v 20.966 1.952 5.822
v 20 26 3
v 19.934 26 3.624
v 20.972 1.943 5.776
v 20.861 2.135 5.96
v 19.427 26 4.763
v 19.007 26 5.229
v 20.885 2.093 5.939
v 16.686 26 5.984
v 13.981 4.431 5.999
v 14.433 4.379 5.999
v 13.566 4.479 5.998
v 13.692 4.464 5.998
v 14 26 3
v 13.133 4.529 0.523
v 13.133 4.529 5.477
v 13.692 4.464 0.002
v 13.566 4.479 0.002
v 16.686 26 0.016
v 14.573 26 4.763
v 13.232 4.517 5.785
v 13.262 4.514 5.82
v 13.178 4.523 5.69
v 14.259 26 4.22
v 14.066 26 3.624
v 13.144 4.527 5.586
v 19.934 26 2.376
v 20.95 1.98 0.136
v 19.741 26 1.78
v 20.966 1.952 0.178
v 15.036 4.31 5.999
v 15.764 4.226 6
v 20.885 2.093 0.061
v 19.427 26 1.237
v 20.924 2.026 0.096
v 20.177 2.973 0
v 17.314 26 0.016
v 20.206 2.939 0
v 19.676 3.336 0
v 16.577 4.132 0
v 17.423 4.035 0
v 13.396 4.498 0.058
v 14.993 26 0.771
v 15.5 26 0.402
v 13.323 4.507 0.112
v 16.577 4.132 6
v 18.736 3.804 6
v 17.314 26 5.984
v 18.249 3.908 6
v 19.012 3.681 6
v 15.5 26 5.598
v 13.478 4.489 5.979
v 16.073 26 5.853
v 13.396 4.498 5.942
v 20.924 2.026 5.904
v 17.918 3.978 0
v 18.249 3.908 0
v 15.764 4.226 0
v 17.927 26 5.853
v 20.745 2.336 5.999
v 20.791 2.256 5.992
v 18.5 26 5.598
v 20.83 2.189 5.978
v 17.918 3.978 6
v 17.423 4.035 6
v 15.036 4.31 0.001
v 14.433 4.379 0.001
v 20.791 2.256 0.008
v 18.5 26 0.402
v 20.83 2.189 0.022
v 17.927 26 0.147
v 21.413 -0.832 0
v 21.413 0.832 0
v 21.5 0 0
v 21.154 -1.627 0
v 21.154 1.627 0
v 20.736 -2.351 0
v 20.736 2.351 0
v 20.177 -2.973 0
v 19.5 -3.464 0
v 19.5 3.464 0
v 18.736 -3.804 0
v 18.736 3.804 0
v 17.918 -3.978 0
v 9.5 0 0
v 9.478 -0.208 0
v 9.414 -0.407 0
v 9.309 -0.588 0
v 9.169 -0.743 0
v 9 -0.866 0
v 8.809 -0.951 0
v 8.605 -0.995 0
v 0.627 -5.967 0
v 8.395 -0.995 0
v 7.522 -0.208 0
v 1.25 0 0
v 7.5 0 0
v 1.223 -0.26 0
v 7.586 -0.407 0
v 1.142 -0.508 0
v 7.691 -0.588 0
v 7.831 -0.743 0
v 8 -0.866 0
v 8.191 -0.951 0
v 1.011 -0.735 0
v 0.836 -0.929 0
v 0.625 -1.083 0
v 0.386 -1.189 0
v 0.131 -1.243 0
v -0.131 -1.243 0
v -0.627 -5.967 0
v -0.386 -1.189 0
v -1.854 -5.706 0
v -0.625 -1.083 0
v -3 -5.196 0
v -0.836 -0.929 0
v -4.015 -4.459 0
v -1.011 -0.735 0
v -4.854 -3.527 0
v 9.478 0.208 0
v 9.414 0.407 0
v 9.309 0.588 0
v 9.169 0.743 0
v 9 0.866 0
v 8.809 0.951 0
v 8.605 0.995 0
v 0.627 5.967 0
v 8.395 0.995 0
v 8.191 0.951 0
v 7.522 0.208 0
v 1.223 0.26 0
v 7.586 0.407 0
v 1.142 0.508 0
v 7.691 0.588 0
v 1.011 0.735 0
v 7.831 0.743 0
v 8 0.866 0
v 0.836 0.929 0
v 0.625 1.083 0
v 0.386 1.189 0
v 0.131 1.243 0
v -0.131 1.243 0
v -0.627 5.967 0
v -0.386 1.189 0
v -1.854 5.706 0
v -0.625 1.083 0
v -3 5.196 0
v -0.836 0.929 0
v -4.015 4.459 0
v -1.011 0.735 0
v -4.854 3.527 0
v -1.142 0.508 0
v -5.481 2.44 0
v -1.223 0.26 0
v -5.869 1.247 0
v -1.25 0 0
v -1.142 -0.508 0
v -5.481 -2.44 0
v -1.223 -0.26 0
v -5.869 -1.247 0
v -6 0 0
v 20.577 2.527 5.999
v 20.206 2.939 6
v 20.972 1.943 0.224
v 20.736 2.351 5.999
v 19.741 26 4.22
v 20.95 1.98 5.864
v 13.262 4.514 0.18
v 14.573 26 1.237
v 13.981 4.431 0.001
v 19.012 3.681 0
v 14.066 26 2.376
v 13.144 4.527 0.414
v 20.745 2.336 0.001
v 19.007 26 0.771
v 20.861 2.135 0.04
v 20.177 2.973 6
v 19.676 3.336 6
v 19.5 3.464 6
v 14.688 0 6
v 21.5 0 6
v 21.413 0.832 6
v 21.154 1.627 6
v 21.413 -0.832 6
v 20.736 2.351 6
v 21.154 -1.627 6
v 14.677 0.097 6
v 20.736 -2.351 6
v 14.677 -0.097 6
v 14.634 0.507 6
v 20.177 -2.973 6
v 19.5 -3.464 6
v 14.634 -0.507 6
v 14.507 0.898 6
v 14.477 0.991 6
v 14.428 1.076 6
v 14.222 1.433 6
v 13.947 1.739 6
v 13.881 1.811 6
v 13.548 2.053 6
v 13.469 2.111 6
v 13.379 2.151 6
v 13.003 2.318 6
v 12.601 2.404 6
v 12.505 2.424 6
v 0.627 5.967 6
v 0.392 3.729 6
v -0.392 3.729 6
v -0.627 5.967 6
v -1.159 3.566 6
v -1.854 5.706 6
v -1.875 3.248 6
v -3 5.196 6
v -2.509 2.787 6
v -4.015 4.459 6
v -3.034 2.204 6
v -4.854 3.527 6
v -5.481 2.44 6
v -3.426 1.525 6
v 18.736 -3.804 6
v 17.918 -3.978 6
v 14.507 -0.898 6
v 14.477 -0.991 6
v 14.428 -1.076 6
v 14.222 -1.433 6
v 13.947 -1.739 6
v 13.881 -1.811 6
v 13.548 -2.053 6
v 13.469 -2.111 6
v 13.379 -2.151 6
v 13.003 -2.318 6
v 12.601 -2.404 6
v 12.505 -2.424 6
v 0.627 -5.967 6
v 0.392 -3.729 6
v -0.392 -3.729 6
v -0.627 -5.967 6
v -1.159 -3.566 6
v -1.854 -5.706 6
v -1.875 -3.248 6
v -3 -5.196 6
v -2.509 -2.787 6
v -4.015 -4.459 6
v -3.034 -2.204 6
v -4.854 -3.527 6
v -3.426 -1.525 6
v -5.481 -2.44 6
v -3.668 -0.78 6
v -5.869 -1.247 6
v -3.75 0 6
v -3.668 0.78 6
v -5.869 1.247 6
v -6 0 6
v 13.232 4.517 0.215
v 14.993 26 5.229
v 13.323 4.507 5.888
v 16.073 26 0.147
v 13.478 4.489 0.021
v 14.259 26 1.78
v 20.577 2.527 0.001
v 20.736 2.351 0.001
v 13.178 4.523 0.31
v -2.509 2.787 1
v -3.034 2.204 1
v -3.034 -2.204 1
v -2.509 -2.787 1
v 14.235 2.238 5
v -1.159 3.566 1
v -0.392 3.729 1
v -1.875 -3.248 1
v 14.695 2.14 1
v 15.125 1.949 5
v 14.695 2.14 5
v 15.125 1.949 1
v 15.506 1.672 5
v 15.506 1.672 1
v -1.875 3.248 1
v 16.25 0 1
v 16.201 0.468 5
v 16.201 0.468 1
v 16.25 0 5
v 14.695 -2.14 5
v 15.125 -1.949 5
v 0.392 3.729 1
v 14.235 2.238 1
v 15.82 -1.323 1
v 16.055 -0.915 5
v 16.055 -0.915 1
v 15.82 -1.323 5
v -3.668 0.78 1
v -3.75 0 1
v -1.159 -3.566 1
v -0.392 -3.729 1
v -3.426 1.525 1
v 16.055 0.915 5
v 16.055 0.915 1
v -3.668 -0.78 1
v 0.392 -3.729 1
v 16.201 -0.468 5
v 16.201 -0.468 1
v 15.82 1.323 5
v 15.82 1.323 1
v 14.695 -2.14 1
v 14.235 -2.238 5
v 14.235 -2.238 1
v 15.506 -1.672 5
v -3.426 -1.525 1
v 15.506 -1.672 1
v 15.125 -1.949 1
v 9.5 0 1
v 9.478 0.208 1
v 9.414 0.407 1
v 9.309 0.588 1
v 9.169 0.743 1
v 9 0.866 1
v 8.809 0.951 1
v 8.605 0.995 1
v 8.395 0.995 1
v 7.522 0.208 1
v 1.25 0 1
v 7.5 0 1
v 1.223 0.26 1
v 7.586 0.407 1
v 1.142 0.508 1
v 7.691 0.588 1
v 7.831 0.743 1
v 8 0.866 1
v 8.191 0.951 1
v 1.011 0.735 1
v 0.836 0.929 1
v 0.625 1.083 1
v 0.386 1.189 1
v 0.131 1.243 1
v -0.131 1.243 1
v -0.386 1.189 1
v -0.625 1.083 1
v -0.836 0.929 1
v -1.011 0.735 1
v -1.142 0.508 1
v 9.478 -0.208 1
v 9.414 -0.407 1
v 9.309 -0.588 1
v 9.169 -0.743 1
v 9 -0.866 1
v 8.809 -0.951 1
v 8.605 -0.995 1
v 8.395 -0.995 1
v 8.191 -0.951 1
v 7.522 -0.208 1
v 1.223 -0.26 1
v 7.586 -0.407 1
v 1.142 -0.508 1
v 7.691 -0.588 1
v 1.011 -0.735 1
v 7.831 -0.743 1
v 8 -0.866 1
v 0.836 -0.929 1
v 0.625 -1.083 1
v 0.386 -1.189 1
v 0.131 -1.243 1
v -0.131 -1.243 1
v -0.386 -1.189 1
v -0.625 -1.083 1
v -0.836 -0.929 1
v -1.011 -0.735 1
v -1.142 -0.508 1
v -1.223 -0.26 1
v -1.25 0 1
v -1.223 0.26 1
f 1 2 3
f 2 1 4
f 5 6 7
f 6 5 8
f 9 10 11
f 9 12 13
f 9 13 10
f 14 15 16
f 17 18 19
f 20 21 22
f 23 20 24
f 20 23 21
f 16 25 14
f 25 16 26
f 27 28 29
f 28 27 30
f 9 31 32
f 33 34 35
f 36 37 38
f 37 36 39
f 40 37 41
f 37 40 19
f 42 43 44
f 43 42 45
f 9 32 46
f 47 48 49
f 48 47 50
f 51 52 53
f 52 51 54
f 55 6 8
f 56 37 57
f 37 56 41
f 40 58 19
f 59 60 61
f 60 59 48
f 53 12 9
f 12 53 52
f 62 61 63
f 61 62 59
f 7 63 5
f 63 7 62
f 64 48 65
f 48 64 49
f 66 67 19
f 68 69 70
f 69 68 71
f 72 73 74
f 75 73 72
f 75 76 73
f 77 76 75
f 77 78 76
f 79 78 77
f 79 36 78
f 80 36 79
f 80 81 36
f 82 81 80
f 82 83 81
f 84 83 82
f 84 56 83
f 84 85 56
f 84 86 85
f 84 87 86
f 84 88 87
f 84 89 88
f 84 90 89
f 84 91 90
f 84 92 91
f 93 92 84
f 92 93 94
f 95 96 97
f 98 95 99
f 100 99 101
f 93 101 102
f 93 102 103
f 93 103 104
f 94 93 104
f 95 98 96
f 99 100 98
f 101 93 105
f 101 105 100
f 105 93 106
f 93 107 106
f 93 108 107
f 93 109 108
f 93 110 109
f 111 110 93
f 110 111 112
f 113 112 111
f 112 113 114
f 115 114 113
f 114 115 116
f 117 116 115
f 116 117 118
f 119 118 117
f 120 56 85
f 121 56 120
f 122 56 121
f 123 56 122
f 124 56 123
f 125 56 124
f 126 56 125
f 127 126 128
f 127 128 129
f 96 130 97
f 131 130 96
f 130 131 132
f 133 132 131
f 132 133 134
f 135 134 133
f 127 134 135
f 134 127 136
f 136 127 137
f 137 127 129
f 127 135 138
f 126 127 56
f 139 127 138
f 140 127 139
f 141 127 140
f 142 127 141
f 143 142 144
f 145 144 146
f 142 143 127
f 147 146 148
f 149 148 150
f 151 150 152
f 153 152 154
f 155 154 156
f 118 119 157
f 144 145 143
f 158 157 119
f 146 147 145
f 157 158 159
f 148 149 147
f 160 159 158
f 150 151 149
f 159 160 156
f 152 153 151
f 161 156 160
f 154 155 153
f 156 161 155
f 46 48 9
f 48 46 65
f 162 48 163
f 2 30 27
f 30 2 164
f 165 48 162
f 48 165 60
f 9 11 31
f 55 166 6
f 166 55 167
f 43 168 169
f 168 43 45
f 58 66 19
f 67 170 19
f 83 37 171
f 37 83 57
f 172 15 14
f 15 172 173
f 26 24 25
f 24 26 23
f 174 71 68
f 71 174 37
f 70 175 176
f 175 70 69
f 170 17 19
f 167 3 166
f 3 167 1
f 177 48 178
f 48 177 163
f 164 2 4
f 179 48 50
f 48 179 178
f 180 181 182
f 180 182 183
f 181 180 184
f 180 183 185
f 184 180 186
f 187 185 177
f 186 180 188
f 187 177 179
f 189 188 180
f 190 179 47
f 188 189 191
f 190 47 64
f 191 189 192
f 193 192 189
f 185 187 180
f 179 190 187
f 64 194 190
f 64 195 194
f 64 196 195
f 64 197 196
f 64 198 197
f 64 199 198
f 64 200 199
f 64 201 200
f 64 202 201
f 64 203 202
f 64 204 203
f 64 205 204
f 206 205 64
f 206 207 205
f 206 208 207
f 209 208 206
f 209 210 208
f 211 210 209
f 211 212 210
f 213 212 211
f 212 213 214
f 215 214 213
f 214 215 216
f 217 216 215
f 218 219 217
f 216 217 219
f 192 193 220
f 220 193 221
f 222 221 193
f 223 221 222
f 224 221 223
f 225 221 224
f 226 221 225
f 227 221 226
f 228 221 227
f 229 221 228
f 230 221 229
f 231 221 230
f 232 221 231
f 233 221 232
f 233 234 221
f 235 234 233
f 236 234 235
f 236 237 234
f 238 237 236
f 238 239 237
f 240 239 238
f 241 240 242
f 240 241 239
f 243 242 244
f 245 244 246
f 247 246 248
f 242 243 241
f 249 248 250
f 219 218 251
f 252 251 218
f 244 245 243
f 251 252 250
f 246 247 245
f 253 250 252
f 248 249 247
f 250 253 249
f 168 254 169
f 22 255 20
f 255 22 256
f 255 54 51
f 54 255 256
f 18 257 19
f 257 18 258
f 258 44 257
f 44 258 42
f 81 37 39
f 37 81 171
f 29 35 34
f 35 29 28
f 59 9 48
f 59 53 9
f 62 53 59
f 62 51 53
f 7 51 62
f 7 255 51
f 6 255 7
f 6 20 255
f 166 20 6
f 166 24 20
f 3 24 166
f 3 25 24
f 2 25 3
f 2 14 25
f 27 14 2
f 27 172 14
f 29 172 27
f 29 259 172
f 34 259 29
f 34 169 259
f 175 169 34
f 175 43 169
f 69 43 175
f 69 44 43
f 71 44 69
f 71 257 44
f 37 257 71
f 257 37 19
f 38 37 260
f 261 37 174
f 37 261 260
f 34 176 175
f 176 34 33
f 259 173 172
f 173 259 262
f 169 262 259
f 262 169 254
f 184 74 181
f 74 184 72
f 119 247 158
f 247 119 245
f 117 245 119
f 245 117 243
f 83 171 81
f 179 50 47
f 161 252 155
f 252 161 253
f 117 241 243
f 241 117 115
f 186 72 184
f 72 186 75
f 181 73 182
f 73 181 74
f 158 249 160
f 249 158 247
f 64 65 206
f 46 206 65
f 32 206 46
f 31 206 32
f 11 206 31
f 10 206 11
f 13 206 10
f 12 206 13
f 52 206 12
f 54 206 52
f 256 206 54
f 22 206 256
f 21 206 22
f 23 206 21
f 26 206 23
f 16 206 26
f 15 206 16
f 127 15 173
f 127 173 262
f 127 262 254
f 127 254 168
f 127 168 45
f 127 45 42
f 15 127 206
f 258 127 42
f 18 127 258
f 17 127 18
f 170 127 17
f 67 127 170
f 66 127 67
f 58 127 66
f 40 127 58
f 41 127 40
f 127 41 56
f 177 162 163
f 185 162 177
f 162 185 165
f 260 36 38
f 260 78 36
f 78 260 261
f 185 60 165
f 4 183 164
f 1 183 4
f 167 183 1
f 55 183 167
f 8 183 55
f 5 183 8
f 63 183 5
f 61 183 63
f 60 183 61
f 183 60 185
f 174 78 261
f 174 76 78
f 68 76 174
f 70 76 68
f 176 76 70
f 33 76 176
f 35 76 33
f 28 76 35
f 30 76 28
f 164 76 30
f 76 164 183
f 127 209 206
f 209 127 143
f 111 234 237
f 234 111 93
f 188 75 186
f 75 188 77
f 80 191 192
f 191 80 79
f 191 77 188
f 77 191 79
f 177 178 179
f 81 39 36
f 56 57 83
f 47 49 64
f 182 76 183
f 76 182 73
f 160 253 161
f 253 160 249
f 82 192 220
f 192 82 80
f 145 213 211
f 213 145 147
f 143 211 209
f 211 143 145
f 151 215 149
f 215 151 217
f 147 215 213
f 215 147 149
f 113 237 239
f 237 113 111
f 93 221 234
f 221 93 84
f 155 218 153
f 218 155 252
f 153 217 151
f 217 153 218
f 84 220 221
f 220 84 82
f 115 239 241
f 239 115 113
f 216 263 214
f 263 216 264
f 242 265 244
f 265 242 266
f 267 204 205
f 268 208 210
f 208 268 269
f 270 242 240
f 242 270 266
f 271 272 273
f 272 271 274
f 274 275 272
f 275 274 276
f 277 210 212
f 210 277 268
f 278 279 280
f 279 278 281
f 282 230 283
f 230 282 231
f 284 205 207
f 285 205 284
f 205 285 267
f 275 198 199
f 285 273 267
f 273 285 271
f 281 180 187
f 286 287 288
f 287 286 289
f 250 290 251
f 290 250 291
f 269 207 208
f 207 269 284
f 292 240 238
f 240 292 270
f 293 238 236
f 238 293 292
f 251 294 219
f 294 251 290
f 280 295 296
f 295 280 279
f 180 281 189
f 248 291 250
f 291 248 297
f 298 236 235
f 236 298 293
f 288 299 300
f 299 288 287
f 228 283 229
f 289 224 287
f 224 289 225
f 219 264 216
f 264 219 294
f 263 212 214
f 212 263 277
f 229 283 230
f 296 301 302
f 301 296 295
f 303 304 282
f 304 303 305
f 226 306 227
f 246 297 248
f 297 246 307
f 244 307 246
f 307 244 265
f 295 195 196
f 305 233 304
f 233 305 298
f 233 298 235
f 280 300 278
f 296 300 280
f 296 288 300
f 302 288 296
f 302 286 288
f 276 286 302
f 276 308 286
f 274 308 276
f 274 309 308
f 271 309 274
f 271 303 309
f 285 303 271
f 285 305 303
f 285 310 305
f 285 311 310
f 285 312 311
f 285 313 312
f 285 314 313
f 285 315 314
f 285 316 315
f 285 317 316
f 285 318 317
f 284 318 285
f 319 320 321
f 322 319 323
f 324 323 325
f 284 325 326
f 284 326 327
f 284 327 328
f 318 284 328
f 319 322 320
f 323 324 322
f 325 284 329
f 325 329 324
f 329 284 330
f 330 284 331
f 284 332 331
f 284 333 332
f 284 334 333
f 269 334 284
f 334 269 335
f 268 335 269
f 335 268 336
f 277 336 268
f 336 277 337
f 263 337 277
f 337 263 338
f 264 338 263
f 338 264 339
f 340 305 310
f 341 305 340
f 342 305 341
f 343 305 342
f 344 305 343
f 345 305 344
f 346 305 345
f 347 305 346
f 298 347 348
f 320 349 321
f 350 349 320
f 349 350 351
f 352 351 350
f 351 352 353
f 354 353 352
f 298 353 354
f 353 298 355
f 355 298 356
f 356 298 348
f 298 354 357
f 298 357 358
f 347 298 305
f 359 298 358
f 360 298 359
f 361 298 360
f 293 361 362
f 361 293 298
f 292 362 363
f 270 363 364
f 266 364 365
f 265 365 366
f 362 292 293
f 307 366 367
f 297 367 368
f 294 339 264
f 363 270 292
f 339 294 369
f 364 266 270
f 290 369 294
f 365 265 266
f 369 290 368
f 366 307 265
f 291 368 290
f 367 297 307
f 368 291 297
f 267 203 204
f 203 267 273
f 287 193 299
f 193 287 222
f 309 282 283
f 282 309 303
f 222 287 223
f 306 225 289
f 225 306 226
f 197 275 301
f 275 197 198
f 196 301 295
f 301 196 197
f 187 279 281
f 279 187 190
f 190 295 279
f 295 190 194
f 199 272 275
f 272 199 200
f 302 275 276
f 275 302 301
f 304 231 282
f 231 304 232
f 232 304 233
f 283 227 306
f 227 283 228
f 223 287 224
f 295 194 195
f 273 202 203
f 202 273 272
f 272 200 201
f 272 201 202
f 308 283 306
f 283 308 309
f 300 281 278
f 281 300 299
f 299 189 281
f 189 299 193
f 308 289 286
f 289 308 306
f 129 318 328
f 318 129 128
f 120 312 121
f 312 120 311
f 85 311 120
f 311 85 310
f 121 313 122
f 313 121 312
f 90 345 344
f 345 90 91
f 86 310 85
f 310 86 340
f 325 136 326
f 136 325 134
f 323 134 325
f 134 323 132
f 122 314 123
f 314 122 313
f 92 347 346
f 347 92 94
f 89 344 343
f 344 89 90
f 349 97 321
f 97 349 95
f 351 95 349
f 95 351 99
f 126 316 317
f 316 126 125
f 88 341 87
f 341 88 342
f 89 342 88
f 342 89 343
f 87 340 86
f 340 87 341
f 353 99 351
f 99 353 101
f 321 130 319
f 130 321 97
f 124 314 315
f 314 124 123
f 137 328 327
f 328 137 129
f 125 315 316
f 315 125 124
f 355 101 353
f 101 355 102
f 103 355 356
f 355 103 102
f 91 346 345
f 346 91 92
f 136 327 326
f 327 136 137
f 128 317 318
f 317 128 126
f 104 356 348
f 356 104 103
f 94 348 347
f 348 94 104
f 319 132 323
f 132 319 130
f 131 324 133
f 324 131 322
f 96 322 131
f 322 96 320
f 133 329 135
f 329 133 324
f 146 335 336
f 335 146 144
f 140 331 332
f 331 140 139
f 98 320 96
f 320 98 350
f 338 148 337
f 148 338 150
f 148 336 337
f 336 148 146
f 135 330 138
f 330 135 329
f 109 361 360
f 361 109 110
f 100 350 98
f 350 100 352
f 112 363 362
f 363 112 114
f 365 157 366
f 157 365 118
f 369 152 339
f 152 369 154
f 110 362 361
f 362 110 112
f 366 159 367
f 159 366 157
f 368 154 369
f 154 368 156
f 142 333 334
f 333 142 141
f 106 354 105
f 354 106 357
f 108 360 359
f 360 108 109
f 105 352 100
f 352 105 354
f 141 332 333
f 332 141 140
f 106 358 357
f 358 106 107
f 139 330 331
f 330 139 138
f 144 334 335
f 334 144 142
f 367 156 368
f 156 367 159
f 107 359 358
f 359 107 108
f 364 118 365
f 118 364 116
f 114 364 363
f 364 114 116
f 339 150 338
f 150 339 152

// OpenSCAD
$fn = 30;

length = 11;

height = 6;

union() {
	//translate([12.5+5,0,0])
	//cylinder(d=8, h=10);

	difference() {

        union() {
			//translate([12.5+5,0,0])
			//cylinder(d=8, h=10);

	hull() {
		translate([length+6,0,0])
		cylinder(d=8.1, h=height);

		translate([length+6,26,height/2])
    		rotate([90,0,0])
		cylinder(d=height, h=1);
	}	


			hull() {
			    translate([12.5+5,0,0])
			    cylinder(d=8, h=height);
			
			    cylinder(d=12, h=height);
			}
		}
	

		translate([0,0,1])
		hull() {
		    translate([14,0,0])
		    cylinder(d=4.5, h=4);
		
		    cylinder(d=7.5, h=12);
		}

		translate([8.5,0,-1])
		cylinder(d=2, h=10);

		//translate([0,0,-1])
		//cylinder(d = 6, h = 4);
	
		//translate([0,0,-.5])
		//cylinder(d = 2.5, h = 4);

		//translate([0,0,.75])
		//cylinder(d = 4.75, h = 4);
	
		translate([0,0,-.5])
		cylinder(d = 2.5, h = 4);

	}
}
